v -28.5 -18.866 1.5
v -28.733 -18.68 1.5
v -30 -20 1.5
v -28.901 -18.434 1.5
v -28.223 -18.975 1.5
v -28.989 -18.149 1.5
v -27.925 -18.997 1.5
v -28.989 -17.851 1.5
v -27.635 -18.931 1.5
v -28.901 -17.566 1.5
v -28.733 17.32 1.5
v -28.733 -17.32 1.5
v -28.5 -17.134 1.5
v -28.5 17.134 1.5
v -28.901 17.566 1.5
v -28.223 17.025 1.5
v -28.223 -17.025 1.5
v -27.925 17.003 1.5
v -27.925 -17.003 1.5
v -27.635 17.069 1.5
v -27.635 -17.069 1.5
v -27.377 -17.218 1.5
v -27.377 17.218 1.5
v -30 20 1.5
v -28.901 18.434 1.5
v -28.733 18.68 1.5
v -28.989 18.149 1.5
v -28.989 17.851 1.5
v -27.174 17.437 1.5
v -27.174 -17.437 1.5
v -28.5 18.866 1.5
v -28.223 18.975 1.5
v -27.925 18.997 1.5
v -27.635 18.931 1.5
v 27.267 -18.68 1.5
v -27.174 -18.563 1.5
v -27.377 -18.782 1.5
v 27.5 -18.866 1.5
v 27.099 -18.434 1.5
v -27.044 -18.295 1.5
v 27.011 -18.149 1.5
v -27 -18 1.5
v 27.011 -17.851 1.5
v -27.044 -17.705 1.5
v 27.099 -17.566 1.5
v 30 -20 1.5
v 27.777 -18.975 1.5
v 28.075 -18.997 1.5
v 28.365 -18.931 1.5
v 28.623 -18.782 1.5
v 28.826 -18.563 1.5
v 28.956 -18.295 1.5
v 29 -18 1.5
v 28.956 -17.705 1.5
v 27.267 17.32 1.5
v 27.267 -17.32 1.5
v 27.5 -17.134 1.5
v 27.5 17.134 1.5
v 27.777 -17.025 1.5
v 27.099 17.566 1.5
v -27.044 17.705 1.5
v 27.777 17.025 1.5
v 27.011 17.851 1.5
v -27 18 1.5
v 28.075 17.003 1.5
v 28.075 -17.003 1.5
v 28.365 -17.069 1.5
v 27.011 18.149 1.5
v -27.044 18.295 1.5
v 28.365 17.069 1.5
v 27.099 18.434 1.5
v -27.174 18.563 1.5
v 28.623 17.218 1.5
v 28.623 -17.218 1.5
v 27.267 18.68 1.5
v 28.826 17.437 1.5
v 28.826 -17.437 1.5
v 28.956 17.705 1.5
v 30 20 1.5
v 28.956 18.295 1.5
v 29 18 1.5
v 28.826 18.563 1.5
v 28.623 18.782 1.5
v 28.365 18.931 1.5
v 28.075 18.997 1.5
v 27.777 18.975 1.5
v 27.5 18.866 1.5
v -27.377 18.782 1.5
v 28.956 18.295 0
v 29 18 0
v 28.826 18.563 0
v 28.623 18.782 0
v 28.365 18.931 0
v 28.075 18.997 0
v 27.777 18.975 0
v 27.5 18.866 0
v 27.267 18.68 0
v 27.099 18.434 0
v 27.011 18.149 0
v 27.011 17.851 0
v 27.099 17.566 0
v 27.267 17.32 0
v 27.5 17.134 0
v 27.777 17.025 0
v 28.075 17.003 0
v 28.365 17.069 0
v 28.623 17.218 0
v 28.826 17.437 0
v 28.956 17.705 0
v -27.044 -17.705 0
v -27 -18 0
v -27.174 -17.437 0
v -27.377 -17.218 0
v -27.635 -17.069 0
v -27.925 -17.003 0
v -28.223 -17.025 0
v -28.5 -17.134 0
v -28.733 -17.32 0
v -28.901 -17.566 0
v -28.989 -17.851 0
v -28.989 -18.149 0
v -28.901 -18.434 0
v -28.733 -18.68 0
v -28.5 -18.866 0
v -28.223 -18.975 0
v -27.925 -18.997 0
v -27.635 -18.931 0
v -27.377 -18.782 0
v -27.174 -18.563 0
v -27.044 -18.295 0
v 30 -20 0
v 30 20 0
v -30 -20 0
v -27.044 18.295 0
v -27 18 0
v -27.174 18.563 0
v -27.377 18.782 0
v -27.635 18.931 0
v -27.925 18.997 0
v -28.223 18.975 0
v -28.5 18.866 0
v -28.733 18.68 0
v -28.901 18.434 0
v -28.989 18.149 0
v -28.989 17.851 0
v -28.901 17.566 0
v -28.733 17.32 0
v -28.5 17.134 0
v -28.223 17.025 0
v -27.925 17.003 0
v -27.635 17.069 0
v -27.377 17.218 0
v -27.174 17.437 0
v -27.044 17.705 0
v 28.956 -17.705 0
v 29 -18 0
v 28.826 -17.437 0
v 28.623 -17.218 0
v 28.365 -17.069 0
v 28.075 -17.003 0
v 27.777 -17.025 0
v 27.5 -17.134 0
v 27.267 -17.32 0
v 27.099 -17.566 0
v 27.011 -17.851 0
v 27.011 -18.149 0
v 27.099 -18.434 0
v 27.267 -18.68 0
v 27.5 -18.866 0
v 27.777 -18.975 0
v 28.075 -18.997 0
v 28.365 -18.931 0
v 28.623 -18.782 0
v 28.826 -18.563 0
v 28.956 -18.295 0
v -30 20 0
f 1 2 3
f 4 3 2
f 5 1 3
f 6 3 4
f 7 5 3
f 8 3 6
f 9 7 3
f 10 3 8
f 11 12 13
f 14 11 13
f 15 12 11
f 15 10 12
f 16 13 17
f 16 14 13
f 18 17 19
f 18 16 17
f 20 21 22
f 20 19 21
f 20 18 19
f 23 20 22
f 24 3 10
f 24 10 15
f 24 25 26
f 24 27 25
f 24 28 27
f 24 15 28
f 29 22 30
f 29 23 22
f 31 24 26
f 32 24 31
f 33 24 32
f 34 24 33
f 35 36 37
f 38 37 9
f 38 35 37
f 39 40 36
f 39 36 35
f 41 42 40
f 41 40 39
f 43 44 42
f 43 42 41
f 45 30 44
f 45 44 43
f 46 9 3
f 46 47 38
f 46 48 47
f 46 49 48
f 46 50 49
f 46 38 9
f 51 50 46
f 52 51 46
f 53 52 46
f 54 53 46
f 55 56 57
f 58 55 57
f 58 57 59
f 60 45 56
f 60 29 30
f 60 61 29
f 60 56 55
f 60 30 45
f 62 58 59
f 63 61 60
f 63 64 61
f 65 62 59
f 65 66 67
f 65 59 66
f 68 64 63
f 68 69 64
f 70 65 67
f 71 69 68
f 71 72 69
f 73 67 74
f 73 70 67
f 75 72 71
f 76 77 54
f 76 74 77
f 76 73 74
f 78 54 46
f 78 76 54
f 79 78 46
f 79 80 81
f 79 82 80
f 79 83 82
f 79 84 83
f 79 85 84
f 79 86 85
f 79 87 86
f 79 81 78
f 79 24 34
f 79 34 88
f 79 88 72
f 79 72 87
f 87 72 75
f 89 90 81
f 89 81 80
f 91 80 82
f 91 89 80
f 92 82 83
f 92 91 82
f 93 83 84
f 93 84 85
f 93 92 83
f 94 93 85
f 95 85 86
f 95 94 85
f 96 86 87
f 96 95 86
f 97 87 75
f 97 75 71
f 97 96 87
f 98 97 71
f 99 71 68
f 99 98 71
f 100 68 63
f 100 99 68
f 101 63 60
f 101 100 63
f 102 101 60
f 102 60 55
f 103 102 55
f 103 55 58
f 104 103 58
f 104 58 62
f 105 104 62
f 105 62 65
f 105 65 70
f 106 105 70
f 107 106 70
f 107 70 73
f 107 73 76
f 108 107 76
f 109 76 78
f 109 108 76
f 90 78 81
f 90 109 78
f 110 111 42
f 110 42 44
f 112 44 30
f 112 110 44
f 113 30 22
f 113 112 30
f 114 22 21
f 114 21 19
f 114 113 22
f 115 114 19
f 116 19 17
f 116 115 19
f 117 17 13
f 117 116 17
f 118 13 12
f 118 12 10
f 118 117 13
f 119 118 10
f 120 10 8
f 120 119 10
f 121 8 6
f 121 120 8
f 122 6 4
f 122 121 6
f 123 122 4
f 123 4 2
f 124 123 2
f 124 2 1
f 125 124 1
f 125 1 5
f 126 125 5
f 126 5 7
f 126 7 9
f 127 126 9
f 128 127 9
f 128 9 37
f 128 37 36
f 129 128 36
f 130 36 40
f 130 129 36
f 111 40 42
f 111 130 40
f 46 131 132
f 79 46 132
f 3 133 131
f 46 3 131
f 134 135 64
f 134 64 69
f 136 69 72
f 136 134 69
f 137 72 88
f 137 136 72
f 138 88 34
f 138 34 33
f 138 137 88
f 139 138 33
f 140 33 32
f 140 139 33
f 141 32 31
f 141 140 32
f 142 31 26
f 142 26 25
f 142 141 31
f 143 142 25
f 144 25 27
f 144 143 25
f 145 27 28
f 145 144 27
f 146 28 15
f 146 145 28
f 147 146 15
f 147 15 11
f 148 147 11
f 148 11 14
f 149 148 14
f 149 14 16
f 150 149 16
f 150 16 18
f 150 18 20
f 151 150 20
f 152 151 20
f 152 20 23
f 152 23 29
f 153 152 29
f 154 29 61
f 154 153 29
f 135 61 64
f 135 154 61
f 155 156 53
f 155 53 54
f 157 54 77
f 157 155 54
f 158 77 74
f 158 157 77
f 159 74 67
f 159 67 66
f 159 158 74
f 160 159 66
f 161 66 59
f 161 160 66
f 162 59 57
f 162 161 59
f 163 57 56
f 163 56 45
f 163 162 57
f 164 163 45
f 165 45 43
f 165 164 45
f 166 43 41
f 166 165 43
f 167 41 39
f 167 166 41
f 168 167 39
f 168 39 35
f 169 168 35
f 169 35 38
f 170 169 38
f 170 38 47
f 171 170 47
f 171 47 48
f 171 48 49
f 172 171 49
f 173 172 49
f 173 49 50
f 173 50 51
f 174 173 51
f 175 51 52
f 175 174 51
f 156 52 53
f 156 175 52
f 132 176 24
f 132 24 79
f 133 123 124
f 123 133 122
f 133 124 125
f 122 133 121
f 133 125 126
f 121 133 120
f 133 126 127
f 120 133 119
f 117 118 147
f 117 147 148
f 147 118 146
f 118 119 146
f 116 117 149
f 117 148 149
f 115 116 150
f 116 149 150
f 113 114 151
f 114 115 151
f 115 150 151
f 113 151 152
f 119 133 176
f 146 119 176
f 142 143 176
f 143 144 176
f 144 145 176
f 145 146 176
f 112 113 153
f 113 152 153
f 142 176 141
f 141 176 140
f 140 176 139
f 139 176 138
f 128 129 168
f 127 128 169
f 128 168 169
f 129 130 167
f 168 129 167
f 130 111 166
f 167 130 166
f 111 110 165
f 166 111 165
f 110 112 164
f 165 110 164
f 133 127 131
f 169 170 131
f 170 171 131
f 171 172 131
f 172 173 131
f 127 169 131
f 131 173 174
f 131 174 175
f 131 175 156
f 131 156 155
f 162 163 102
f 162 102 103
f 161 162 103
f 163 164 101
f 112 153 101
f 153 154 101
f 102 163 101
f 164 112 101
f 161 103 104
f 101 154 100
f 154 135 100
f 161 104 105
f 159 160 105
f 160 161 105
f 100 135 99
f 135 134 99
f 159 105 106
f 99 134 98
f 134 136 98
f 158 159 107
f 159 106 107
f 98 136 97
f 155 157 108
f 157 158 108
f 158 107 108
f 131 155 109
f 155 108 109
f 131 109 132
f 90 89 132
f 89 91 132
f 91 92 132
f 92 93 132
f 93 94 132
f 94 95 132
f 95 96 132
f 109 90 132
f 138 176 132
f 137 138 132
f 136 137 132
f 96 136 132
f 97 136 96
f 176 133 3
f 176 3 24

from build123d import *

# Parameters (mm, degrees)
F1_W     = 60
F1_H     = 40
F2_DEPTH = 1.5
F3_R     = 1
F4_DEPTH = 1.5


with BuildPart() as f2:
    # F1 (on Top) → F2 (new body)
    with BuildSketch(Plane.XY):
        Rectangle(F1_W, F1_H)
    extrude(amount=F2_DEPTH)

    # F3 (on face) → F4 (cut, through all)
    with BuildSketch(Plane.XY):
        with Locations((-28, 18)):
            Circle(F3_R)
        with Locations((28, 18)):
            Circle(F3_R)
        with Locations((28, -18)):
            Circle(F3_R)
        with Locations((-28, -18)):
            Circle(F3_R)
    extrude(amount=F4_DEPTH, mode=Mode.SUBTRACT)


solid = f2.part
